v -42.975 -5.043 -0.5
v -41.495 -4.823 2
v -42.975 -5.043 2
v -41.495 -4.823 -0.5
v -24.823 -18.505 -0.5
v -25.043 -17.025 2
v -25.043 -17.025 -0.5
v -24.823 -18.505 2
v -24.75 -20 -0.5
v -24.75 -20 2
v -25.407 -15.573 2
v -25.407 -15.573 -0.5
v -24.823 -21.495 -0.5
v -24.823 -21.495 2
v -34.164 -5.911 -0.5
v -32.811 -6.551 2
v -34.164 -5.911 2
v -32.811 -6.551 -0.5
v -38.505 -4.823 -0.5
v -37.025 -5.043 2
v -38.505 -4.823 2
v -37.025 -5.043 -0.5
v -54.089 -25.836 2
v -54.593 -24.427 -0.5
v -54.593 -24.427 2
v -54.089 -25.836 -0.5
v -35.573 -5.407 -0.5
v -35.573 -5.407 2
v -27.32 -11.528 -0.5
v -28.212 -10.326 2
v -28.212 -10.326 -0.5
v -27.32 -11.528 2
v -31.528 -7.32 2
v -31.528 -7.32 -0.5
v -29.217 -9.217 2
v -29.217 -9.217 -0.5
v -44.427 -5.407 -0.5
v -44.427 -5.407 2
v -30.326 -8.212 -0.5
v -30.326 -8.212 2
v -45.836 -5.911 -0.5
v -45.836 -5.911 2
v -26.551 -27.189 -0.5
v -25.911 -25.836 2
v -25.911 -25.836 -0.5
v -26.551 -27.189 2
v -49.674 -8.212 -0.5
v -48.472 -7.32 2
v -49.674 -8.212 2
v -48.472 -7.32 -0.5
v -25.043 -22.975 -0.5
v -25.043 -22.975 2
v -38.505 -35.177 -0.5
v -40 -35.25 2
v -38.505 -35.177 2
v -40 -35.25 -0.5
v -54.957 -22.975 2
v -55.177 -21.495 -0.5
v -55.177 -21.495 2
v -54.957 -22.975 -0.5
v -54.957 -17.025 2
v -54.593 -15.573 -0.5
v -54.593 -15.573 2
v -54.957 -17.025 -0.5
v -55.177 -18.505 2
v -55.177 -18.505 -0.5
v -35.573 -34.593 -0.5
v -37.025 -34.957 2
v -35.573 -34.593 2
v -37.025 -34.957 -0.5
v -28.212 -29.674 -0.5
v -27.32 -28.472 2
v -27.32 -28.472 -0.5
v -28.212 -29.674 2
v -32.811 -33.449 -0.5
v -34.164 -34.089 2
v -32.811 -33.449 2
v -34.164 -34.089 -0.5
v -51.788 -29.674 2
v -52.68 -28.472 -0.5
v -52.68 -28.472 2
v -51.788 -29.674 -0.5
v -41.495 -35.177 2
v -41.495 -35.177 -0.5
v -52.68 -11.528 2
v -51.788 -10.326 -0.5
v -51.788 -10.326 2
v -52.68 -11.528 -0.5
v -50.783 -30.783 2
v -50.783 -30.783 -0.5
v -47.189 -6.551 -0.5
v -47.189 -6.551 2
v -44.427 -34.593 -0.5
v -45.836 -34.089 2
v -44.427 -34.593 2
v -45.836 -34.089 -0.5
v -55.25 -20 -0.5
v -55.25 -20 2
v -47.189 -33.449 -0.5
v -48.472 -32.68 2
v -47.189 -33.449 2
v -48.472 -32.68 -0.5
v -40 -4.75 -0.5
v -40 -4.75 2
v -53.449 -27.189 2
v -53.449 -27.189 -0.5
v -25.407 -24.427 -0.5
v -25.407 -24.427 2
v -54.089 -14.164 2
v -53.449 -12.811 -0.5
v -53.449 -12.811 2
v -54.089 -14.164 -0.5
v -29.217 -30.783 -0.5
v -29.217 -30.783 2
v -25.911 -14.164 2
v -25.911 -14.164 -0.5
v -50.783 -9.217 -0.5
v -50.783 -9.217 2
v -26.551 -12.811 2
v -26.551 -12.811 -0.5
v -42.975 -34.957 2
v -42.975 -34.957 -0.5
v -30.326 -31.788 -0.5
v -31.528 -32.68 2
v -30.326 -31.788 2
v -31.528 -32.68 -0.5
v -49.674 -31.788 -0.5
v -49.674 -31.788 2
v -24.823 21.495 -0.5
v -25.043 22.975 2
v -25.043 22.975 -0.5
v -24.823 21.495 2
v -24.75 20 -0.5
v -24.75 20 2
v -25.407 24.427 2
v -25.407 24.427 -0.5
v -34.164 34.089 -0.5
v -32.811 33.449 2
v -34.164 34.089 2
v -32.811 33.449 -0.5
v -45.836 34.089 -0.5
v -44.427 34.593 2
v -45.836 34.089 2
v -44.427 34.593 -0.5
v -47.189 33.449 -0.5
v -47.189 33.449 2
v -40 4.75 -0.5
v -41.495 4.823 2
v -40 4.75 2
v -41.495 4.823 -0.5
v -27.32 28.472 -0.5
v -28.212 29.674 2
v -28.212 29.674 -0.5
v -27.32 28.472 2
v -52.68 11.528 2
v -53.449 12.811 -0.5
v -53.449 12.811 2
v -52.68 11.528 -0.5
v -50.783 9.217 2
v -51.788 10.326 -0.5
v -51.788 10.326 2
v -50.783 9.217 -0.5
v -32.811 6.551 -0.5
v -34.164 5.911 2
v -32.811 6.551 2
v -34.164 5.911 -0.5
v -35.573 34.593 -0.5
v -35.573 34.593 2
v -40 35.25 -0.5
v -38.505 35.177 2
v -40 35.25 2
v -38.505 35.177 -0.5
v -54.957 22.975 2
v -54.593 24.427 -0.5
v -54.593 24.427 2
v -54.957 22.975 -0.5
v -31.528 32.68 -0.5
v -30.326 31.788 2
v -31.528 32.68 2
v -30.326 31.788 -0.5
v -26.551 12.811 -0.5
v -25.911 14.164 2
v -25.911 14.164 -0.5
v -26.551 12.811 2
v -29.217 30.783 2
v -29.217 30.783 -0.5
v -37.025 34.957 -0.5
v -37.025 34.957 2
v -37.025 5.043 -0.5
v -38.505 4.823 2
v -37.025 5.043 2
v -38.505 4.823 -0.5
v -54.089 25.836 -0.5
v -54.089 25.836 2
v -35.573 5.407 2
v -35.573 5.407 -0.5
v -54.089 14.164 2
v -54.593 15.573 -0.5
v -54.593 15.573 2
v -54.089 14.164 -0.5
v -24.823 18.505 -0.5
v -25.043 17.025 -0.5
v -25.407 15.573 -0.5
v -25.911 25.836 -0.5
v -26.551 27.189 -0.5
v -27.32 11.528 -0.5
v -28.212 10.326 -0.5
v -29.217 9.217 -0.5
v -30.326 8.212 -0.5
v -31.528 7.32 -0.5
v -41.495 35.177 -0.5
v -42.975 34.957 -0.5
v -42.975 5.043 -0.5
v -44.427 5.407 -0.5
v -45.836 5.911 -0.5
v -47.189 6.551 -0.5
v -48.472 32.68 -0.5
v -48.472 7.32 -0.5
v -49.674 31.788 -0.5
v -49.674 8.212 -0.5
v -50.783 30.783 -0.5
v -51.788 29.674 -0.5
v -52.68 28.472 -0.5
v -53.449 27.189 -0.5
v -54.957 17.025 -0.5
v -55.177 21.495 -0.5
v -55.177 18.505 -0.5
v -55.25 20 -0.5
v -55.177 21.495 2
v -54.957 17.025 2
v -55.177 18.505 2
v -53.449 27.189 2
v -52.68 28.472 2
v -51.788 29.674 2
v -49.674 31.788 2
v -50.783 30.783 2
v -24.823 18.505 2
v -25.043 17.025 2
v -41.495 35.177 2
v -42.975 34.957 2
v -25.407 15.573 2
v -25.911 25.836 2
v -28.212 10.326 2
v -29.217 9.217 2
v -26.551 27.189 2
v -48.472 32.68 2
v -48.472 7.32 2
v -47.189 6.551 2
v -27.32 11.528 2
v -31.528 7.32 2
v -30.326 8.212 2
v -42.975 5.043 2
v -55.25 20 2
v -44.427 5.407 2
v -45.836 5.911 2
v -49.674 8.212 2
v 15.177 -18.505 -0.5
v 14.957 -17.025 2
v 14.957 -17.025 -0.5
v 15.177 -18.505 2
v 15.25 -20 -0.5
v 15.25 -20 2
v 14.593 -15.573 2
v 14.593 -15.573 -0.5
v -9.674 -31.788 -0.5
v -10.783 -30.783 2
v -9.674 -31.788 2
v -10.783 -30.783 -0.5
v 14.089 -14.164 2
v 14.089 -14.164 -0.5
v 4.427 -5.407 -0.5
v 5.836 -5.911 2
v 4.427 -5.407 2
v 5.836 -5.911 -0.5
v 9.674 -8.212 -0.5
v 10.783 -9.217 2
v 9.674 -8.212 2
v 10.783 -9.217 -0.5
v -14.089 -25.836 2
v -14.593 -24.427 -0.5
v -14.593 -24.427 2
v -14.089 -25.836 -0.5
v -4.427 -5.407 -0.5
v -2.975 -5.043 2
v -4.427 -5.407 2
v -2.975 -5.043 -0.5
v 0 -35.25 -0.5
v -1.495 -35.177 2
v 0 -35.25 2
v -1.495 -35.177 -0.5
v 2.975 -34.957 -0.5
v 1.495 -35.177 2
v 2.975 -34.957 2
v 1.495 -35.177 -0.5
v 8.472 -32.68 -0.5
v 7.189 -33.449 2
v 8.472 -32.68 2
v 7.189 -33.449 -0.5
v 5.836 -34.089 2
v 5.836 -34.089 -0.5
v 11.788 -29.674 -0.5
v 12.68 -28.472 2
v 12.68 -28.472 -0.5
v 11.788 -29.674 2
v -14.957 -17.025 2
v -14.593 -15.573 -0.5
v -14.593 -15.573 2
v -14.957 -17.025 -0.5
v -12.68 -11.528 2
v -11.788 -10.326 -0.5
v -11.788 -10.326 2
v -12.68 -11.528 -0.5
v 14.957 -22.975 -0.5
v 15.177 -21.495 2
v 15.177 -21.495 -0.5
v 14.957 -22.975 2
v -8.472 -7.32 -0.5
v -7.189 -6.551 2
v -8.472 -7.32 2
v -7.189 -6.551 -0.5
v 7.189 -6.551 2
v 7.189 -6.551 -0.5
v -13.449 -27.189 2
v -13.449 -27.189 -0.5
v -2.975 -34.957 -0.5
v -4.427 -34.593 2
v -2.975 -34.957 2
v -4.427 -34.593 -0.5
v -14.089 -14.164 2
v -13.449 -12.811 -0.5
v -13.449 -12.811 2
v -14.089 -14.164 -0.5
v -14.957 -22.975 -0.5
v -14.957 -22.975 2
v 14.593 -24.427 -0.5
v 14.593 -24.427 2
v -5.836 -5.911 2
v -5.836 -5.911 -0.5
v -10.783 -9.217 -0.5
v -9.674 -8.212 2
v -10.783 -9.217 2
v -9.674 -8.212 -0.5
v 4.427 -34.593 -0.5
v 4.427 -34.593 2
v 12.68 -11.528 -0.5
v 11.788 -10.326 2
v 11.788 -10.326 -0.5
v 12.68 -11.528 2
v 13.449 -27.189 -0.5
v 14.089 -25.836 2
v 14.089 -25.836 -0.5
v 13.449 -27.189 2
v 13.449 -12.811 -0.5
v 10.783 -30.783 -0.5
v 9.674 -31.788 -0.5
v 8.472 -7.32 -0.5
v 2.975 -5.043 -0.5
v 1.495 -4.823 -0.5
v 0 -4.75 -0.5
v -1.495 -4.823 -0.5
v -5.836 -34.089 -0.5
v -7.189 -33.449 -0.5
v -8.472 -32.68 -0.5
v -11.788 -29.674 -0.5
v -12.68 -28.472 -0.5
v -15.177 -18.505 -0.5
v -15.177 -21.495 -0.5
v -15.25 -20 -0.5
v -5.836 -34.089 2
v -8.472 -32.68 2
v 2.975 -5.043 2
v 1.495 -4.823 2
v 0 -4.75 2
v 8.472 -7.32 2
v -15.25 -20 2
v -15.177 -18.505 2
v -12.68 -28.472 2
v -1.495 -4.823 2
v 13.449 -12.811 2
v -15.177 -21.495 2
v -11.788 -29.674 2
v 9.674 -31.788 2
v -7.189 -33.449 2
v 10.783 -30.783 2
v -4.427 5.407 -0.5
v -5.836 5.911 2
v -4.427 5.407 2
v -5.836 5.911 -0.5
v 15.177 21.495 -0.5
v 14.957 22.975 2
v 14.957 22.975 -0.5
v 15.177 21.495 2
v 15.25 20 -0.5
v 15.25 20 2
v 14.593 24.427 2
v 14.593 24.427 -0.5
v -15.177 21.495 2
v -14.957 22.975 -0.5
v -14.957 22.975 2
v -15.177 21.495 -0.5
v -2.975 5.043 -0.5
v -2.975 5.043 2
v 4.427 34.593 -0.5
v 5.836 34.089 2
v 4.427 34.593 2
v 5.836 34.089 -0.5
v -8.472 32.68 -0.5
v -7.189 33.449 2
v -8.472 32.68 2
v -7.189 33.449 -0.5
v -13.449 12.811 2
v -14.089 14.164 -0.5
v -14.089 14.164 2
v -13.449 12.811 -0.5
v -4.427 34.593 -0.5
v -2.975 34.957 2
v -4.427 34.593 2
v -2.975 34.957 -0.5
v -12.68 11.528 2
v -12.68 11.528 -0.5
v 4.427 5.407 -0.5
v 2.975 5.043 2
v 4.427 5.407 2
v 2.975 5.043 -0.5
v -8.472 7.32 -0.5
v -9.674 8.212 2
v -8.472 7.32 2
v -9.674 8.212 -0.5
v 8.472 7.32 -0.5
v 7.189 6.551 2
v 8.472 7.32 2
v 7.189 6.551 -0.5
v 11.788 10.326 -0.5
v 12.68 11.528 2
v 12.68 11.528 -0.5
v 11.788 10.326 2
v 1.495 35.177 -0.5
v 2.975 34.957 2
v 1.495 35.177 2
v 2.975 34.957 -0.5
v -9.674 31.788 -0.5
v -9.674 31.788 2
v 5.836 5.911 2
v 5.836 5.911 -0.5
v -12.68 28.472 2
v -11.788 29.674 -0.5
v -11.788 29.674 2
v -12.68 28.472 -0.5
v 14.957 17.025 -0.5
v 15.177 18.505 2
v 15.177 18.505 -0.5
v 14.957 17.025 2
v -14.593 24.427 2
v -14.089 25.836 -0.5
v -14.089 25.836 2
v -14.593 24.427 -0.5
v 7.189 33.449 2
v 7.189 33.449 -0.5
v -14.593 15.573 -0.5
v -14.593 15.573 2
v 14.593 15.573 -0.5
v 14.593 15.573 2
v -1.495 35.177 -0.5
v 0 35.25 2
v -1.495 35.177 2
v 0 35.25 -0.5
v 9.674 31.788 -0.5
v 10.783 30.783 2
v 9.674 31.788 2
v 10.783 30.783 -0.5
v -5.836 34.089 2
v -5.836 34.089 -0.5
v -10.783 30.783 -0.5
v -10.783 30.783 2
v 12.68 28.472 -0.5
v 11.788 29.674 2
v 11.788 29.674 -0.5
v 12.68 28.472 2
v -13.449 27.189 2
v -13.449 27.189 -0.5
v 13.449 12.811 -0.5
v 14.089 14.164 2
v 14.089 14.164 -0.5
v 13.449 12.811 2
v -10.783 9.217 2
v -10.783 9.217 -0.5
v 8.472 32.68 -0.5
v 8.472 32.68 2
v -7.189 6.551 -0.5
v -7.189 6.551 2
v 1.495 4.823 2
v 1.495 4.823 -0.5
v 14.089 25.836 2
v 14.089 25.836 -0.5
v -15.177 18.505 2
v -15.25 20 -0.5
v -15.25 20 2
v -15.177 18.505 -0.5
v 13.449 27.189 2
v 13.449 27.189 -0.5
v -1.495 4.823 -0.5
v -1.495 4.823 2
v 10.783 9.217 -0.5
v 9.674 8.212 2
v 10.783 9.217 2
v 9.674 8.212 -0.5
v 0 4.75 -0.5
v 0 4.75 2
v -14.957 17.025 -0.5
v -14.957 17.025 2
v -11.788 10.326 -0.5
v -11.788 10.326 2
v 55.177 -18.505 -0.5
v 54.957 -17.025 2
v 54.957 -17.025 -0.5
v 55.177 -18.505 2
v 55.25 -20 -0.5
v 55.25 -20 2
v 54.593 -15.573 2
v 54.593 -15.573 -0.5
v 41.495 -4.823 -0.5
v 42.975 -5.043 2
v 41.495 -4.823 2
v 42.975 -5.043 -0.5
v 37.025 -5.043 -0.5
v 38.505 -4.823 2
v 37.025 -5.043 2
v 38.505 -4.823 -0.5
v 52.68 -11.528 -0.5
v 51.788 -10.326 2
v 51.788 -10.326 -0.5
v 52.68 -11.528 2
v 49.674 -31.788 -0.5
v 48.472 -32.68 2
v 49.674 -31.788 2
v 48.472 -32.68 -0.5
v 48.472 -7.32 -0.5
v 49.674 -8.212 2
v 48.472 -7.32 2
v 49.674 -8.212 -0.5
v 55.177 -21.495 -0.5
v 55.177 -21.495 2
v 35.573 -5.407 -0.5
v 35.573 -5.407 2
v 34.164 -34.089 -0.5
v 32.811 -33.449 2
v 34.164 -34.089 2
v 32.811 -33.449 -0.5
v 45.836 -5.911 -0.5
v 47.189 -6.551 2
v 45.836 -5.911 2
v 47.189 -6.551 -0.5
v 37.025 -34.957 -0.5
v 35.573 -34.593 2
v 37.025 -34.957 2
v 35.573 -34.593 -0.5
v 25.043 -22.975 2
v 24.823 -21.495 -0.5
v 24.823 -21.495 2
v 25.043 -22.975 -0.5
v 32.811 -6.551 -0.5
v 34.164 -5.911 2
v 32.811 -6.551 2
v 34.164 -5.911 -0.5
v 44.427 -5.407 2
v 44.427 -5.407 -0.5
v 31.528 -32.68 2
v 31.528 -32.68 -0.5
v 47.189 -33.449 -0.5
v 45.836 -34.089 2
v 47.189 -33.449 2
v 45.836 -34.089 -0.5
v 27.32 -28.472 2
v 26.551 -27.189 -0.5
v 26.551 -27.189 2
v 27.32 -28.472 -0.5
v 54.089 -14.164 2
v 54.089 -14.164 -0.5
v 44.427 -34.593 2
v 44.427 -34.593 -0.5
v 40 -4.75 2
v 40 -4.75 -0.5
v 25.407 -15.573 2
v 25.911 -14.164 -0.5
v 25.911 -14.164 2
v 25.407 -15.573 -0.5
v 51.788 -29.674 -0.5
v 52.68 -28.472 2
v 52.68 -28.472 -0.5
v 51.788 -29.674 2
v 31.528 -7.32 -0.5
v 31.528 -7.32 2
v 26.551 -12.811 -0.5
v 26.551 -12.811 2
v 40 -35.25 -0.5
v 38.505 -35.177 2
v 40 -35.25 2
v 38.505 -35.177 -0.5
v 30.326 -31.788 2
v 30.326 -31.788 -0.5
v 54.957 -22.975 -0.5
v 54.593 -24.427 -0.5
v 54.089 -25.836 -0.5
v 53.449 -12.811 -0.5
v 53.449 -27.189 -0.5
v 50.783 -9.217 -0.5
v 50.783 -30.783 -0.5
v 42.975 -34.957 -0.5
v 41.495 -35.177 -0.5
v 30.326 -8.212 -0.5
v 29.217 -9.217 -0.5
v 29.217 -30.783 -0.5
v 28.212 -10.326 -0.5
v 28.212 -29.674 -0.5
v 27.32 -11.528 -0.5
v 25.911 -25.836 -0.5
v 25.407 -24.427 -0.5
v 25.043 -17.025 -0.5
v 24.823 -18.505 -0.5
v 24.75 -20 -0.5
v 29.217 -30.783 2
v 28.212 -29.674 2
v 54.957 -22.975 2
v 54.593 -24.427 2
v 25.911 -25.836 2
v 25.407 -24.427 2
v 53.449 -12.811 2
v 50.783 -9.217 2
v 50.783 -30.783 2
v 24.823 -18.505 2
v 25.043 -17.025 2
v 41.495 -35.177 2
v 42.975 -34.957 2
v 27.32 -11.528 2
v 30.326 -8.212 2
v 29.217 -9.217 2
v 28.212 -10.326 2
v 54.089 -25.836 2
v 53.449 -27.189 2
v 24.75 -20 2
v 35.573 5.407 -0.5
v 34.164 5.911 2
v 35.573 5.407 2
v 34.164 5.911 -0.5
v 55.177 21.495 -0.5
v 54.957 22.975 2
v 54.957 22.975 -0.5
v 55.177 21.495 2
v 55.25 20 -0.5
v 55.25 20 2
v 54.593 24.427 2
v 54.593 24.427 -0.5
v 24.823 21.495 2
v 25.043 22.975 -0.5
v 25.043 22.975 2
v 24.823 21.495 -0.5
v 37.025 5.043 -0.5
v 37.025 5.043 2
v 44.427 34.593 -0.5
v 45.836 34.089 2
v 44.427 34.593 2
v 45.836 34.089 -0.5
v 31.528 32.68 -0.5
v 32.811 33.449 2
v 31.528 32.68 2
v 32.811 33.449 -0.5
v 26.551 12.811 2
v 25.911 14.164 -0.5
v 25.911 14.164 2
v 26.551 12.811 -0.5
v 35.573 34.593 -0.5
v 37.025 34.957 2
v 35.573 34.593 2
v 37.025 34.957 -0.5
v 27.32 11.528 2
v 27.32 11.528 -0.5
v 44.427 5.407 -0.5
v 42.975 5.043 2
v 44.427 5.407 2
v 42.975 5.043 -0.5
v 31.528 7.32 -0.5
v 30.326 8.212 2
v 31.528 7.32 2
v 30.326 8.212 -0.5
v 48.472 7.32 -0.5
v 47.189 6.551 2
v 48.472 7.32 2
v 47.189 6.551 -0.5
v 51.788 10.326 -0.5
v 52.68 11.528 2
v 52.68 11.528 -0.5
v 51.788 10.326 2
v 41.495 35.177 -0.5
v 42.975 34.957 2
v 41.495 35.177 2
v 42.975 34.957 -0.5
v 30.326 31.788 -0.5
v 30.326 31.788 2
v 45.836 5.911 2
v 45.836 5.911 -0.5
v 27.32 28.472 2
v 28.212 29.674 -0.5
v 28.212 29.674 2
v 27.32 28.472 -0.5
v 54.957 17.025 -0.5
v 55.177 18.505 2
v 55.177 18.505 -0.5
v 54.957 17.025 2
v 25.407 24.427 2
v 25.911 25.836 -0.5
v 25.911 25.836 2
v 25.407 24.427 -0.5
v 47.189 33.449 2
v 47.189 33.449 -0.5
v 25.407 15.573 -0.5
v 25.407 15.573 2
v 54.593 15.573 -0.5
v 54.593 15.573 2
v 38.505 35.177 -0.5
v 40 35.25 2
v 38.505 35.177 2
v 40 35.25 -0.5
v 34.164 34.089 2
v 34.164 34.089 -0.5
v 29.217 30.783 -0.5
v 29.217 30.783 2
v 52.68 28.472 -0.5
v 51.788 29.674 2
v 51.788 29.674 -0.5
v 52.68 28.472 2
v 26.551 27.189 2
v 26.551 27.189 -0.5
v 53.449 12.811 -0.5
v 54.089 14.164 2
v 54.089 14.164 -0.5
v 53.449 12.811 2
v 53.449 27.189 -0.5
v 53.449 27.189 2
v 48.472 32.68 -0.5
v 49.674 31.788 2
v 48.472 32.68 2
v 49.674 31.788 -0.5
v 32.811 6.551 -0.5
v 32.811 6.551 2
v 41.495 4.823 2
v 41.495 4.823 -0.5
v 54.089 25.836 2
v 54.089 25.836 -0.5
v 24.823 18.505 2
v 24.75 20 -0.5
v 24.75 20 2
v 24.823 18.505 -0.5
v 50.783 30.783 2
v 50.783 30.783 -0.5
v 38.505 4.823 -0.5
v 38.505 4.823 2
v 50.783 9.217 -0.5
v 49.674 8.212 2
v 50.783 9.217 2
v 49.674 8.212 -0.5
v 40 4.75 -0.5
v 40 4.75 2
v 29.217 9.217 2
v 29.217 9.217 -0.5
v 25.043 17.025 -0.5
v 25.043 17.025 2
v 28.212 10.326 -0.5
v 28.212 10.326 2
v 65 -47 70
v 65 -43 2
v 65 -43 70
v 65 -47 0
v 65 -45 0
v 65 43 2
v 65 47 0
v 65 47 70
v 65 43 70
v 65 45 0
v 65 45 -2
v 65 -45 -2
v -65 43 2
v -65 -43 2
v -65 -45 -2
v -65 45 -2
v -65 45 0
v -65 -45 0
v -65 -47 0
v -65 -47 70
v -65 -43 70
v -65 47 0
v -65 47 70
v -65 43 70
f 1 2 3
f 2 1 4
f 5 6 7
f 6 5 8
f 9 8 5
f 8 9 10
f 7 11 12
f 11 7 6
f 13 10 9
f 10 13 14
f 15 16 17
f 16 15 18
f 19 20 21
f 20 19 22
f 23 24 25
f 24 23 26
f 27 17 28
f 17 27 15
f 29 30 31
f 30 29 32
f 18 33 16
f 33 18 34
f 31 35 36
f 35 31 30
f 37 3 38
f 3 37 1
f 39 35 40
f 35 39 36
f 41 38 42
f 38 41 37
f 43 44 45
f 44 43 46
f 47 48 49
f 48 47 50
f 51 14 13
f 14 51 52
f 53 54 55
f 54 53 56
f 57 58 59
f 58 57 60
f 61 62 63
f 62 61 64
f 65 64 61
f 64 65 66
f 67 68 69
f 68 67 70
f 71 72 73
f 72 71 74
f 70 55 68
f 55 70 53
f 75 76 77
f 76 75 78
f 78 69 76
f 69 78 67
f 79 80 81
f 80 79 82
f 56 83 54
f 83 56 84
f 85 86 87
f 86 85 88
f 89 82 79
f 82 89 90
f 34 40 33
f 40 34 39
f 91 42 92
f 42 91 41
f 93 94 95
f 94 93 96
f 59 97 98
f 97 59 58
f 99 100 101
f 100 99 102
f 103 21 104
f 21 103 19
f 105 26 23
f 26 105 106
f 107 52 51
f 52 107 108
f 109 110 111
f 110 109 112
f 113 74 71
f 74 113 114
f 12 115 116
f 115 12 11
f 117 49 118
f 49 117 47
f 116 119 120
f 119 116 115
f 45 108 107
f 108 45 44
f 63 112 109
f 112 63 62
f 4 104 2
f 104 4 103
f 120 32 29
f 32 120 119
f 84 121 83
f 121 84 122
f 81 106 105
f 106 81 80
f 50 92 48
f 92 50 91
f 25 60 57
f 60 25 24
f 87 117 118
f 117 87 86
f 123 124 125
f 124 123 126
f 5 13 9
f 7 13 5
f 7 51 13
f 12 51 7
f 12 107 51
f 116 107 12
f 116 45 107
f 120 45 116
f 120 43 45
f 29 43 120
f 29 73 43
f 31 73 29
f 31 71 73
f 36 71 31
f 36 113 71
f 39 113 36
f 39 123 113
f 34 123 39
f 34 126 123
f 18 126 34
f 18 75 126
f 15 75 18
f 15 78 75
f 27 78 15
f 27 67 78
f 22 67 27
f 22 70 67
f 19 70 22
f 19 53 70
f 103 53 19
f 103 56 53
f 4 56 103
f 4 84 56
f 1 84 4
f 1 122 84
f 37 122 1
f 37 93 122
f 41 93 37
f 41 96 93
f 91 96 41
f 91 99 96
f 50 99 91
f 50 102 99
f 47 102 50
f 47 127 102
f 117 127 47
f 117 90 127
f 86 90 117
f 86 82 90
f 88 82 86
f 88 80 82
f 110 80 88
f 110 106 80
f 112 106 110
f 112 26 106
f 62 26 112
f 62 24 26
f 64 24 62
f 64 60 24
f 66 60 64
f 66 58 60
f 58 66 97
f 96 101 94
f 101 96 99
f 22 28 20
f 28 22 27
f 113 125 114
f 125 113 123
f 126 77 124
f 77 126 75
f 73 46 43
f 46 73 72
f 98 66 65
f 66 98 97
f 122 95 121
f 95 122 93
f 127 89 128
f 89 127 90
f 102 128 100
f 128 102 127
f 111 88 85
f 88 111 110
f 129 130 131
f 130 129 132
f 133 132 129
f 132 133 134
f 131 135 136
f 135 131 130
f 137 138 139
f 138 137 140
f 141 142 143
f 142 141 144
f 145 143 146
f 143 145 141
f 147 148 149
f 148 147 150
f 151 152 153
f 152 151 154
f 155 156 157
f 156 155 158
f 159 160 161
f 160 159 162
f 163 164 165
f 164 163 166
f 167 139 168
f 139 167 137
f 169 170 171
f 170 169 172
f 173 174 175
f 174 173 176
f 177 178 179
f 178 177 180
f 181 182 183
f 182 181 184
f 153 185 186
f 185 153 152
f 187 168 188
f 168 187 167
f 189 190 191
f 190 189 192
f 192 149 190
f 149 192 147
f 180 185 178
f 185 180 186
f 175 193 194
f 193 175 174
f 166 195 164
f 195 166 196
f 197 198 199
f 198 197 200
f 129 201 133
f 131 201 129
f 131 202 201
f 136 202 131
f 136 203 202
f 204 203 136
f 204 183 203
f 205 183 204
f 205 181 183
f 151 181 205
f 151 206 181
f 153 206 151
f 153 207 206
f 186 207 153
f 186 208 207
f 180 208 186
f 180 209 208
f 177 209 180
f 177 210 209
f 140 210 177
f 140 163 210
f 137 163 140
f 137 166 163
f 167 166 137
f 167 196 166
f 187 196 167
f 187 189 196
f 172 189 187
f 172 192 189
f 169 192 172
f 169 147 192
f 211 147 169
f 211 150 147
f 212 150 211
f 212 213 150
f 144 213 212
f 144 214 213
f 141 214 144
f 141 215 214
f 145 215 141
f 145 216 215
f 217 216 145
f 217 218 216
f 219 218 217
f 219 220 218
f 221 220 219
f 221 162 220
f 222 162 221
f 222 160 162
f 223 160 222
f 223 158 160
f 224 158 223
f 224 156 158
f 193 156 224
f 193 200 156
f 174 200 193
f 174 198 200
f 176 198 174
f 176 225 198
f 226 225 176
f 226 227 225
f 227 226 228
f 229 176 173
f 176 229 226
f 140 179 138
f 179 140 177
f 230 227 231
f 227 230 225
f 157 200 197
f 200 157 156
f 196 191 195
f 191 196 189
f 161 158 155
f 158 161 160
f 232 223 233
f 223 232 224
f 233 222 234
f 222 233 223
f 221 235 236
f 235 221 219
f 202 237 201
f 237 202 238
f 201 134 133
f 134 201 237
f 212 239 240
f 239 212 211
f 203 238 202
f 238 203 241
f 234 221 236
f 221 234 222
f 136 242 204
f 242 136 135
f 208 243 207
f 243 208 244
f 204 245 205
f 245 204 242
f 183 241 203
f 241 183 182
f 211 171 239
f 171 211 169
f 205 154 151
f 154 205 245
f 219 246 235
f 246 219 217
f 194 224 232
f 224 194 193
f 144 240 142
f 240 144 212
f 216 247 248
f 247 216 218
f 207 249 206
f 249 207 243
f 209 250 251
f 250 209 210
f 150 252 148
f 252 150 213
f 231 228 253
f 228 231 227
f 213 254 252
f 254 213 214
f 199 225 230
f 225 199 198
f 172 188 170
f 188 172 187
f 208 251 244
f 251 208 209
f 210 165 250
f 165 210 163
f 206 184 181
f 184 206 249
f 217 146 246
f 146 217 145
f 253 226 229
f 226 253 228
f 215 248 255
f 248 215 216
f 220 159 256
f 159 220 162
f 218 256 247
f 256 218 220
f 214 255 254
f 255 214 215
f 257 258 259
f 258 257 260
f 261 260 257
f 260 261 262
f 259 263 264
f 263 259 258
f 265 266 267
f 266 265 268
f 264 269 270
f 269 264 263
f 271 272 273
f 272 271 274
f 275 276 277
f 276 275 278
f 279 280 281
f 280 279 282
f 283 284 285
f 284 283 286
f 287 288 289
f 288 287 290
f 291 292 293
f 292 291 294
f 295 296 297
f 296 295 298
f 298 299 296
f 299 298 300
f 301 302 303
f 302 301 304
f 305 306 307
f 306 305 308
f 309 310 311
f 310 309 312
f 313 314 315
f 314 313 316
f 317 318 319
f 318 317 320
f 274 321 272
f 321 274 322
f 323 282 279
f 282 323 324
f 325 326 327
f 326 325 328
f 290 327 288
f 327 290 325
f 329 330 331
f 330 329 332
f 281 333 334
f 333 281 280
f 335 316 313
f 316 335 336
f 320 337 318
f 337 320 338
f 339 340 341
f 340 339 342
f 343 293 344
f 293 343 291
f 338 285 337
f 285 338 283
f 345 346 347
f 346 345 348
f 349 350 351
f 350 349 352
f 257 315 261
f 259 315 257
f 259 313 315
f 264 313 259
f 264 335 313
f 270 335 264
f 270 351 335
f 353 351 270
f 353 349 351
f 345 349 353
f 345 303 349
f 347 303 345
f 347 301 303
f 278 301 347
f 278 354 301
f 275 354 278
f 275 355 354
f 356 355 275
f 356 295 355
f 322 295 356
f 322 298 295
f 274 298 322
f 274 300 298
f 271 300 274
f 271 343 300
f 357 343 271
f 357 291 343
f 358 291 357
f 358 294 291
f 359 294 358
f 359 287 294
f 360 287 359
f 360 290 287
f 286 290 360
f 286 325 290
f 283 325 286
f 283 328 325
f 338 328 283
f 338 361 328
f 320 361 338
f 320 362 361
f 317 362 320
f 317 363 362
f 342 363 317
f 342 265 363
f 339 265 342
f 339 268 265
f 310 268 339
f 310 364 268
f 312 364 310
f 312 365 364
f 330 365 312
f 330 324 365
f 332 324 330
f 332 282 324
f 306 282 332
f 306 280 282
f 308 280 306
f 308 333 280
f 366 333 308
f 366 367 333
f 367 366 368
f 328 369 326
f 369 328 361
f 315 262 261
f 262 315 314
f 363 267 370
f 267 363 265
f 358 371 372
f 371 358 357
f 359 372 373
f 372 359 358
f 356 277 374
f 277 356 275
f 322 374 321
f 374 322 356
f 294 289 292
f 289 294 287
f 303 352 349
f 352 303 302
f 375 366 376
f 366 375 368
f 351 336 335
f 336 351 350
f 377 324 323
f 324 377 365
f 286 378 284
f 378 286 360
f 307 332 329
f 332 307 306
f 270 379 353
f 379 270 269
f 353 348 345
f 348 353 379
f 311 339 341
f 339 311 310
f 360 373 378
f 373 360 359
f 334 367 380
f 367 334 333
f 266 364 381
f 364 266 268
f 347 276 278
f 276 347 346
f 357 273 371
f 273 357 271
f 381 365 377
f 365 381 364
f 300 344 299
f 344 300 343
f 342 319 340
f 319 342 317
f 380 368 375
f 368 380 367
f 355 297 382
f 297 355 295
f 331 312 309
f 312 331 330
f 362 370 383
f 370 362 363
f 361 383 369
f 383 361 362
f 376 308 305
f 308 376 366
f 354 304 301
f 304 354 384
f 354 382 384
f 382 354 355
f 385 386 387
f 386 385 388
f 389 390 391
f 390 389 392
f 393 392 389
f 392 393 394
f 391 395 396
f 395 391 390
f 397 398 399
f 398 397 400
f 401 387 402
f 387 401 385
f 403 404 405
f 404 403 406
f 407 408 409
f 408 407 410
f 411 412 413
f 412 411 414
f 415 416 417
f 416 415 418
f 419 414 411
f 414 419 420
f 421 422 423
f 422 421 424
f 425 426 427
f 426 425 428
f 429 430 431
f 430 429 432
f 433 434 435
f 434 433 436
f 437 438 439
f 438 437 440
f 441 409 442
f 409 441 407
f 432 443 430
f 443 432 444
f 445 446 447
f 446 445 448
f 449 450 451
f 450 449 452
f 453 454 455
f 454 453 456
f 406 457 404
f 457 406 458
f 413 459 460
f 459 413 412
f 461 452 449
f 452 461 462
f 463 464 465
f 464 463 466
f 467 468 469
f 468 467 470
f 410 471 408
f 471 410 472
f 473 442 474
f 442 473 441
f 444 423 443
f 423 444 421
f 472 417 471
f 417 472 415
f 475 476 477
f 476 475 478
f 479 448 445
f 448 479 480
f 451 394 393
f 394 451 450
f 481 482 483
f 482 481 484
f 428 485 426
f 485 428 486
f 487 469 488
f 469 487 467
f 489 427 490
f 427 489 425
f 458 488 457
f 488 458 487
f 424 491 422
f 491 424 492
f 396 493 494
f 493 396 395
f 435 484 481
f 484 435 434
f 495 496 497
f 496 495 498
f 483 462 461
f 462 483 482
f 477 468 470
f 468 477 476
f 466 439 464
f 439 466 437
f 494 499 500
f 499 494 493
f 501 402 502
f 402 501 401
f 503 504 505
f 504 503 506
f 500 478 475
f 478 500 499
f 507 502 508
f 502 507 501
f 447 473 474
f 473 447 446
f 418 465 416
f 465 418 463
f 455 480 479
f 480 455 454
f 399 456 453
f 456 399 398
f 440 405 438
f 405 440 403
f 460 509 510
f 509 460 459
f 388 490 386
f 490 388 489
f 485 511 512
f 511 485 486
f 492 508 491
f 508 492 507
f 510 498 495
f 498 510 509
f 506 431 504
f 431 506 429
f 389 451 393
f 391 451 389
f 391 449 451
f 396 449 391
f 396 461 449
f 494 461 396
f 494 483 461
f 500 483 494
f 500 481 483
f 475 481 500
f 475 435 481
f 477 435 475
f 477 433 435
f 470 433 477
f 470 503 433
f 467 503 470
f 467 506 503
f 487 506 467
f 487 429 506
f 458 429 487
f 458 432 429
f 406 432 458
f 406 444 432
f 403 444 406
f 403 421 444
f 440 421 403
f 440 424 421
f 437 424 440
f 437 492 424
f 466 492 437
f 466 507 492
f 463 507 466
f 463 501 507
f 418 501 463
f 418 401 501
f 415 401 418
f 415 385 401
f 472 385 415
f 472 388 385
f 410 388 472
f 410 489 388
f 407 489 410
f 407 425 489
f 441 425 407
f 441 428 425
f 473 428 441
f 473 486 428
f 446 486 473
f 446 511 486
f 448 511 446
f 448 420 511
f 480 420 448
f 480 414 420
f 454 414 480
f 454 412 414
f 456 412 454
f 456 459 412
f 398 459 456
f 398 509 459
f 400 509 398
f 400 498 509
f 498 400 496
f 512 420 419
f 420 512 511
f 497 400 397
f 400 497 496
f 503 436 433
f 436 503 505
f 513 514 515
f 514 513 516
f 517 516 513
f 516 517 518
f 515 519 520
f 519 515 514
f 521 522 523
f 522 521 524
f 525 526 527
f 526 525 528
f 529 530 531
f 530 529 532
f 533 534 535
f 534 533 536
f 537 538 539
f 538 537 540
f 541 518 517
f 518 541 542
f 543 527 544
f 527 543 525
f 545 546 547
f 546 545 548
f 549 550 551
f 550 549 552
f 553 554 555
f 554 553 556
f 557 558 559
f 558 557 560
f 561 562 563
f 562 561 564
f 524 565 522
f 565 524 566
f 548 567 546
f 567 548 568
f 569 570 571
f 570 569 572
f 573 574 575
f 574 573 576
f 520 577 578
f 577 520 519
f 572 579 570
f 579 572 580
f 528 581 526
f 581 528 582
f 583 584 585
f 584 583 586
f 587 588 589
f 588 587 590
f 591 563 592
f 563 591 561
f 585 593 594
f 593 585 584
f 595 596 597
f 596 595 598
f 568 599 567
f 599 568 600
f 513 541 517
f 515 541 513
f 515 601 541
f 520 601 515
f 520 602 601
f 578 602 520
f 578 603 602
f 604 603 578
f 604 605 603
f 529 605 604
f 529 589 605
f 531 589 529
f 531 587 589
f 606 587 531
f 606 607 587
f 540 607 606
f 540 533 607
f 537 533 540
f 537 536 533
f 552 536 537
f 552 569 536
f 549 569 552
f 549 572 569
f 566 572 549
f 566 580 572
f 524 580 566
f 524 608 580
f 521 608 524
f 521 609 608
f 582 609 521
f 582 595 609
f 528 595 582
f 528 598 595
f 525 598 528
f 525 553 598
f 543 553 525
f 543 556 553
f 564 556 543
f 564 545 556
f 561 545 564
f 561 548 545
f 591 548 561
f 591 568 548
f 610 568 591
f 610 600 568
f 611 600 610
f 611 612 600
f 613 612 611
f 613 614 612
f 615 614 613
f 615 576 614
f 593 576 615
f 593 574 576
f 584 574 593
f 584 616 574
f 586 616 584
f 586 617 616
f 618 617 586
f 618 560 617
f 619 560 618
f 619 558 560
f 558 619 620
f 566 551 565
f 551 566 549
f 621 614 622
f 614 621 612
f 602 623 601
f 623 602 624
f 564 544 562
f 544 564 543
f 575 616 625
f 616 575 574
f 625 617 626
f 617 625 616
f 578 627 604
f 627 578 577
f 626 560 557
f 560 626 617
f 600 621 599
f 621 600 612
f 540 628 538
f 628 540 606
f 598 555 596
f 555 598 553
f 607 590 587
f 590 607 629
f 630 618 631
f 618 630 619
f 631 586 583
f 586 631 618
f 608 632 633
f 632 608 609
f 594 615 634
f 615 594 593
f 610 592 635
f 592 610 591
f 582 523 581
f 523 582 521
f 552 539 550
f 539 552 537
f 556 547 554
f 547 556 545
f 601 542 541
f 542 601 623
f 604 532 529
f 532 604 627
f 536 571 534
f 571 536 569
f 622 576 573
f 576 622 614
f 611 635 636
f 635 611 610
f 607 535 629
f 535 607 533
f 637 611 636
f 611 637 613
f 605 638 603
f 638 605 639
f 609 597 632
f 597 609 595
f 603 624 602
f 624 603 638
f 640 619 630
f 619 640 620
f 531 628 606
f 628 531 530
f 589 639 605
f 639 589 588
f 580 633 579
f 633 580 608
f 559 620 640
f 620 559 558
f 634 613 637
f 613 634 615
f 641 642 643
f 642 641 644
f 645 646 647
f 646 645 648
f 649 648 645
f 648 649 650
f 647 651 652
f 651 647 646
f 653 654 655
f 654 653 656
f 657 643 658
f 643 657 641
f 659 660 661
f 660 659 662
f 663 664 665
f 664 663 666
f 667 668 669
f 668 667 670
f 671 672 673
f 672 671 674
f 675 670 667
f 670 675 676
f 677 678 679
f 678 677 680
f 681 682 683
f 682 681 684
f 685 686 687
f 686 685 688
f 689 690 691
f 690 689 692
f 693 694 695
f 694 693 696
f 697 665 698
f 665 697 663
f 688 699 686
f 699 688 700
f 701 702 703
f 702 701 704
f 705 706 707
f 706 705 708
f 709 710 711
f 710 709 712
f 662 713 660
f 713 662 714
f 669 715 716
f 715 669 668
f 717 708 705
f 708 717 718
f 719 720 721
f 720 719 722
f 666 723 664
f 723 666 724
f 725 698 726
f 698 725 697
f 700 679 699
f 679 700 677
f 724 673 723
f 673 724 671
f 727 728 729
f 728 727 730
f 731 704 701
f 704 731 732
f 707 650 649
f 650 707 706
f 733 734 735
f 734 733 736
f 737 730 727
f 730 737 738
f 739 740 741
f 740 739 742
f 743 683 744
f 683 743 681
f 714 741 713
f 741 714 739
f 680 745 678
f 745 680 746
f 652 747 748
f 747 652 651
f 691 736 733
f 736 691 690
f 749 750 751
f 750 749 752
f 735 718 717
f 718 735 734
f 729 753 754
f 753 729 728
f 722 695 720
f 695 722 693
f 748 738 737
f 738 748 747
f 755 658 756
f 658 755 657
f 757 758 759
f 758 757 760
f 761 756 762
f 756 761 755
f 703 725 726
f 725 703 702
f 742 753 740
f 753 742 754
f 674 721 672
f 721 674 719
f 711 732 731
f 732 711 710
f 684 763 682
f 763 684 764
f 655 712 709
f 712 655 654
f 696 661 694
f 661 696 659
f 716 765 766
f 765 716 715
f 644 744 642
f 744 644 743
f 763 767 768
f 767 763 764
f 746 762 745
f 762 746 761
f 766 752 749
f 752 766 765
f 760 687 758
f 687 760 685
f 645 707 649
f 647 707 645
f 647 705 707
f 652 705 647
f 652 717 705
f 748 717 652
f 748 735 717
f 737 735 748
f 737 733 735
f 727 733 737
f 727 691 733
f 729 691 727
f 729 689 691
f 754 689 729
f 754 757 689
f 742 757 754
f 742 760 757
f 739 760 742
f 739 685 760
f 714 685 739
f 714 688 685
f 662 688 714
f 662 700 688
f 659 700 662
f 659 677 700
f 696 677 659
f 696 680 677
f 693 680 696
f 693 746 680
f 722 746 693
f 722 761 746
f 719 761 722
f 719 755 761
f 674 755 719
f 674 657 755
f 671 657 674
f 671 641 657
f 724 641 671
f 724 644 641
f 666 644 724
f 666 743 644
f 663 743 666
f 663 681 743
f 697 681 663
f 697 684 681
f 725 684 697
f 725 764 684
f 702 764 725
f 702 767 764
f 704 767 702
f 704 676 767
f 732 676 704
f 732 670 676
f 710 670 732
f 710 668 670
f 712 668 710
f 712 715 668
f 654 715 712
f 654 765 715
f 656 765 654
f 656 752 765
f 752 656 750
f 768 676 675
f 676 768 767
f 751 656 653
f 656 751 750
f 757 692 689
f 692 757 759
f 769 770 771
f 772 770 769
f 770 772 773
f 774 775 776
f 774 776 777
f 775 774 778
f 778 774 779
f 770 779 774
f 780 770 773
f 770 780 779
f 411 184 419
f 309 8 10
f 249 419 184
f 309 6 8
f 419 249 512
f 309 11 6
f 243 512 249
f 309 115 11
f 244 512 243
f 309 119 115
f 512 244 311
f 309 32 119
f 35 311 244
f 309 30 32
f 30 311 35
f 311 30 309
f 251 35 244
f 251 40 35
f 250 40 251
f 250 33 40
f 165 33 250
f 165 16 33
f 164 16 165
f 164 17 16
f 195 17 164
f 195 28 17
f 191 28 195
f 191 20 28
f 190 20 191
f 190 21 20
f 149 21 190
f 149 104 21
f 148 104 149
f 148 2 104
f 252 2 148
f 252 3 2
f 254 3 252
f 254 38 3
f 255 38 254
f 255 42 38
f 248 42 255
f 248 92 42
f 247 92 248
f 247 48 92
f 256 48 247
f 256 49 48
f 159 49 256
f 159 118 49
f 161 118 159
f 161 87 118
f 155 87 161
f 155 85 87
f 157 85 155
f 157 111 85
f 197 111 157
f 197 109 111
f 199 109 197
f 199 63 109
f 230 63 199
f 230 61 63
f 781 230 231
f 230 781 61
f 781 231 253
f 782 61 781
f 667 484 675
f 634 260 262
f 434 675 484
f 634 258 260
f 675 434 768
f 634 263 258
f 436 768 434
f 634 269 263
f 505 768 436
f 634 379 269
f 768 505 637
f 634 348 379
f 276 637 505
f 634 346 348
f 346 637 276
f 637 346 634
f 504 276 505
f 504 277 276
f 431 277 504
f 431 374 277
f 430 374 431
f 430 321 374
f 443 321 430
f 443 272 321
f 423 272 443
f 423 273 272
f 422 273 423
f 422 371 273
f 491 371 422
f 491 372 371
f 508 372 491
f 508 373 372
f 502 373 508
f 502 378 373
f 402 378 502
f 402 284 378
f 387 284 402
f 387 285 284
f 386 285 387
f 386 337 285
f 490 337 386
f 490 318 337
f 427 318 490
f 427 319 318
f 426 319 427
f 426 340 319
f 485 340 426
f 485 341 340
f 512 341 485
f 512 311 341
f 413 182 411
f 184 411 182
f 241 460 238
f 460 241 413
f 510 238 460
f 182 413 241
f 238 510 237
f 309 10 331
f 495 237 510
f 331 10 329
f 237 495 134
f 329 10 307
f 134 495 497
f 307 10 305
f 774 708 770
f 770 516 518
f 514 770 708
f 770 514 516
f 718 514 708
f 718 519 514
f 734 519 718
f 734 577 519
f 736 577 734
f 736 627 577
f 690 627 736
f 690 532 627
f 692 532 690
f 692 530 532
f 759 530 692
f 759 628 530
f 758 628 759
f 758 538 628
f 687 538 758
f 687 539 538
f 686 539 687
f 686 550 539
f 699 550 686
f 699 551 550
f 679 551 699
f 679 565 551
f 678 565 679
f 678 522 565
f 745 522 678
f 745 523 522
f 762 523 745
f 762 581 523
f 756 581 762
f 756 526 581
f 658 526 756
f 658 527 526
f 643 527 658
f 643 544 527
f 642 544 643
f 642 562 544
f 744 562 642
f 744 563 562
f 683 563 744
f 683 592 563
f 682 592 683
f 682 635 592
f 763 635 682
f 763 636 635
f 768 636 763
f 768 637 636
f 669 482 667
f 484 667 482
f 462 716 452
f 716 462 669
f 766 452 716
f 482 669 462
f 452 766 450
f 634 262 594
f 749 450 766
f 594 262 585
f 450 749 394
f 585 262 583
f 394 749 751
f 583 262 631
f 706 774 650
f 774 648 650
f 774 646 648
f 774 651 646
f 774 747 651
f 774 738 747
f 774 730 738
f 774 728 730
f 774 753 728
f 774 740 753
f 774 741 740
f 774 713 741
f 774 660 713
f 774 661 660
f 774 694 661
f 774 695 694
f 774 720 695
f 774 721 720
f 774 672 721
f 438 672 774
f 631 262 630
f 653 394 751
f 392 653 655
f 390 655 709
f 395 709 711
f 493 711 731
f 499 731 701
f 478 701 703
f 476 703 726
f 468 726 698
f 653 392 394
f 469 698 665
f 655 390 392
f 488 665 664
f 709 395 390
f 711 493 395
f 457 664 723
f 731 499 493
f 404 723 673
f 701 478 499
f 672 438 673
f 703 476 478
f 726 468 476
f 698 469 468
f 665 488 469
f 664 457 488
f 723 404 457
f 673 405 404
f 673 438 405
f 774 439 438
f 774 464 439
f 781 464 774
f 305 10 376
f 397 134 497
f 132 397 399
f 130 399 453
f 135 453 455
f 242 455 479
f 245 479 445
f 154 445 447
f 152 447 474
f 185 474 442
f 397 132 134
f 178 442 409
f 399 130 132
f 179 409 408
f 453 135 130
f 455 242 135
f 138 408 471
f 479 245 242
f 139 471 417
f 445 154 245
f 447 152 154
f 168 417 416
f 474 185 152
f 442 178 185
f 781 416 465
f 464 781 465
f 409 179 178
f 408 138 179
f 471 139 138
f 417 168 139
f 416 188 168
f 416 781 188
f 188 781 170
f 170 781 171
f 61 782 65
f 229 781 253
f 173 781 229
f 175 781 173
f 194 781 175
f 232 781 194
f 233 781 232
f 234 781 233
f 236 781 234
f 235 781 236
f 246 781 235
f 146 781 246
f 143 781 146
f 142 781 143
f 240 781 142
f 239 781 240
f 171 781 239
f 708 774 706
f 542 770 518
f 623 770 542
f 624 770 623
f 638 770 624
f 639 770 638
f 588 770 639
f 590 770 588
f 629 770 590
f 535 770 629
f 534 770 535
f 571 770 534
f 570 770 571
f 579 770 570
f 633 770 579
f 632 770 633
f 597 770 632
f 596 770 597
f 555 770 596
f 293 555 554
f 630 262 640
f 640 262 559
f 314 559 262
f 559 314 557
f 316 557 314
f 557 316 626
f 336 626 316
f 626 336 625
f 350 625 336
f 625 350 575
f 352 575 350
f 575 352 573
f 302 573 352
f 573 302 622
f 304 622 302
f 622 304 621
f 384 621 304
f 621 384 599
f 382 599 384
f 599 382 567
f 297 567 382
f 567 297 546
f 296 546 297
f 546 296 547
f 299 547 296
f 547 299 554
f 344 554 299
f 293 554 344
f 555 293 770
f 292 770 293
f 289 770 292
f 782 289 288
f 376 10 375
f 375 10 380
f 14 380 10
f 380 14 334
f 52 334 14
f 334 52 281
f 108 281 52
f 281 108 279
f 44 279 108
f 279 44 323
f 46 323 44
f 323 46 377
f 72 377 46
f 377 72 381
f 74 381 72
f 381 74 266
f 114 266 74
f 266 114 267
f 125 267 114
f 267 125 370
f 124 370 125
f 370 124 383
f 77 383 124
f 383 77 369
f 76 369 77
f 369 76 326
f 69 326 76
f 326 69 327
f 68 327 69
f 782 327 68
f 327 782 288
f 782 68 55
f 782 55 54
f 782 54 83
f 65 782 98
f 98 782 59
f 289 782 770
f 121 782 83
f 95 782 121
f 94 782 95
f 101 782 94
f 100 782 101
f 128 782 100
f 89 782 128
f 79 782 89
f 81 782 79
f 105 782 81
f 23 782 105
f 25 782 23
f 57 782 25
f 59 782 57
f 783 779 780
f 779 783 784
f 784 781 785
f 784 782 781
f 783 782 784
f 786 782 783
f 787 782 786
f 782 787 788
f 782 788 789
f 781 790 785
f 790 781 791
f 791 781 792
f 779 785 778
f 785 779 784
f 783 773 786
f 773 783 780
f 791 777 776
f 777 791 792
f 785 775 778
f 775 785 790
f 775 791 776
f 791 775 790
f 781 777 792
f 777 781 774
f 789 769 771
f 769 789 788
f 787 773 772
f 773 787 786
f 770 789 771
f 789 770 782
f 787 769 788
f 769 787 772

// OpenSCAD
// 50 mL conical tube rack – printed upside-down, then flipped over.
// Print orientation: flat plate on the bed (z = 0..4), walls rising in +Z.
// After flipping: rack stands on the two walls; tubes pass through the holes.

// ---- Plate ----
plate_x   = 130;   // plate length along X (mm)
plate_y   = 90;    // plate width  along Y (mm)
plate_t   = 4;     // plate thickness (mm)

// ---- Tube holes ----
hole_d    = 30.5;  // through-hole diameter (mm)
hole_r    = hole_d / 2;
pitch     = 40;    // centre-to-centre spacing in both X and Y (mm)

// ---- Side walls (run along the two long edges) ----
wall_len  = 130;   // wall length along X (mm)
wall_t    = 4;     // wall thickness along Y (mm)
wall_h    = 70;    // wall height above the bed (mm)

$fn = 64;

// Hole centres: 2 rows (Y) x 3 columns (X), centred on the plate.
// X offsets: -40, 0, +40   (3 columns, 40 mm pitch)
// Y offsets: -20, +20       (2 rows,    40 mm pitch)
hole_x = [-pitch, 0, pitch];
hole_y = [-pitch / 2, pitch / 2];

// ---- Base plate with six through-holes ----
module plate() { difference() {
    cube([plate_x, plate_y, plate_t], center = true);
    for (hx = hole_x) {
        for (hy = hole_y) {
            translate([hx, hy, -0.5]) {
                cylinder(h = plate_t + 1, r = hole_r, $fn = $fn);
            }
        }
    }
} }

// ---- Two solid walls along the long edges, flush with the plate ----
// Each wall: 130 mm (X) x 4 mm (Y) x 70 mm (Z), centred on the plate in X,
// centred on the plate's long edge in Y, rising from z = 0 to z = 70.
module walls() { union() {
    // Wall on the +Y edge
    translate([0,  plate_y / 2, wall_h / 2]) {
        cube([wall_len, wall_t, wall_h], center = true);
    }
    // Wall on the -Y edge
    translate([0, -plate_y / 2, wall_h / 2]) {
        cube([wall_len, wall_t, wall_h], center = true);
    }
} }

// ---- Assemble the rack in print orientation ----
union() {
    plate();
    walls();
}
